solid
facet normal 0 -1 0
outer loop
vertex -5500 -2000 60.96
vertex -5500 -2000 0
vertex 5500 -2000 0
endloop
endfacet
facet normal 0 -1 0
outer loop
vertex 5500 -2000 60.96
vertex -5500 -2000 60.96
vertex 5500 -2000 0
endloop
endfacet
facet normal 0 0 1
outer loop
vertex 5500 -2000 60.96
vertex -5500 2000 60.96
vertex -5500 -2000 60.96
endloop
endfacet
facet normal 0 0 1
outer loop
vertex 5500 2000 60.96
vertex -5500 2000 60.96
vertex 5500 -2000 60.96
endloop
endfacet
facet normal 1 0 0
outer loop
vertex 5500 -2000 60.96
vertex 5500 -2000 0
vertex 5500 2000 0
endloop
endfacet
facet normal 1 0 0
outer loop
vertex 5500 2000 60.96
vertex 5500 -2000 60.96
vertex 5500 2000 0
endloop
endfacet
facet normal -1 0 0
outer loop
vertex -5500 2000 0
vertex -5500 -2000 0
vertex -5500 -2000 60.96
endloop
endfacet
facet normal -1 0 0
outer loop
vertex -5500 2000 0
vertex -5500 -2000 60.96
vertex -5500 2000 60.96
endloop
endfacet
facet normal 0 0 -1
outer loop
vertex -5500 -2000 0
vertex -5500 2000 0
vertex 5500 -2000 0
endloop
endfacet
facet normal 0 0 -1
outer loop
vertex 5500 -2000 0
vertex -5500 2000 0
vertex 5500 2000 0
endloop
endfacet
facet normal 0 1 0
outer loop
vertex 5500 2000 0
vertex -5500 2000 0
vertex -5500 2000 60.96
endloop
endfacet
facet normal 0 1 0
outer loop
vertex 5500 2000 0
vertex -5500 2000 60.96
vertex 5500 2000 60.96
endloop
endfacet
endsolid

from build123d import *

# Parameters (mm, degrees)
F0_W     = 11000
F0_H     = 4000
F1_DEPTH = 60.96
F2_W     = 4000
F2_H     = 1955.003793
F3_DEPTH = 30.48


with BuildPart() as f1:
    # F0 (on Top) → F1 (new body)
    with BuildSketch(Plane.XY):
        Rectangle(F0_W, F0_H)
    extrude(amount=F1_DEPTH)


with BuildPart() as f3:
    # F2 (on face) → F3 (new body)
    with BuildSketch(Plane.YZ.offset(5500)):
        with Locations((0, 1038.461896)):
            Rectangle(F2_W, F2_H)
    extrude(amount=F3_DEPTH)


solid = f1.part
